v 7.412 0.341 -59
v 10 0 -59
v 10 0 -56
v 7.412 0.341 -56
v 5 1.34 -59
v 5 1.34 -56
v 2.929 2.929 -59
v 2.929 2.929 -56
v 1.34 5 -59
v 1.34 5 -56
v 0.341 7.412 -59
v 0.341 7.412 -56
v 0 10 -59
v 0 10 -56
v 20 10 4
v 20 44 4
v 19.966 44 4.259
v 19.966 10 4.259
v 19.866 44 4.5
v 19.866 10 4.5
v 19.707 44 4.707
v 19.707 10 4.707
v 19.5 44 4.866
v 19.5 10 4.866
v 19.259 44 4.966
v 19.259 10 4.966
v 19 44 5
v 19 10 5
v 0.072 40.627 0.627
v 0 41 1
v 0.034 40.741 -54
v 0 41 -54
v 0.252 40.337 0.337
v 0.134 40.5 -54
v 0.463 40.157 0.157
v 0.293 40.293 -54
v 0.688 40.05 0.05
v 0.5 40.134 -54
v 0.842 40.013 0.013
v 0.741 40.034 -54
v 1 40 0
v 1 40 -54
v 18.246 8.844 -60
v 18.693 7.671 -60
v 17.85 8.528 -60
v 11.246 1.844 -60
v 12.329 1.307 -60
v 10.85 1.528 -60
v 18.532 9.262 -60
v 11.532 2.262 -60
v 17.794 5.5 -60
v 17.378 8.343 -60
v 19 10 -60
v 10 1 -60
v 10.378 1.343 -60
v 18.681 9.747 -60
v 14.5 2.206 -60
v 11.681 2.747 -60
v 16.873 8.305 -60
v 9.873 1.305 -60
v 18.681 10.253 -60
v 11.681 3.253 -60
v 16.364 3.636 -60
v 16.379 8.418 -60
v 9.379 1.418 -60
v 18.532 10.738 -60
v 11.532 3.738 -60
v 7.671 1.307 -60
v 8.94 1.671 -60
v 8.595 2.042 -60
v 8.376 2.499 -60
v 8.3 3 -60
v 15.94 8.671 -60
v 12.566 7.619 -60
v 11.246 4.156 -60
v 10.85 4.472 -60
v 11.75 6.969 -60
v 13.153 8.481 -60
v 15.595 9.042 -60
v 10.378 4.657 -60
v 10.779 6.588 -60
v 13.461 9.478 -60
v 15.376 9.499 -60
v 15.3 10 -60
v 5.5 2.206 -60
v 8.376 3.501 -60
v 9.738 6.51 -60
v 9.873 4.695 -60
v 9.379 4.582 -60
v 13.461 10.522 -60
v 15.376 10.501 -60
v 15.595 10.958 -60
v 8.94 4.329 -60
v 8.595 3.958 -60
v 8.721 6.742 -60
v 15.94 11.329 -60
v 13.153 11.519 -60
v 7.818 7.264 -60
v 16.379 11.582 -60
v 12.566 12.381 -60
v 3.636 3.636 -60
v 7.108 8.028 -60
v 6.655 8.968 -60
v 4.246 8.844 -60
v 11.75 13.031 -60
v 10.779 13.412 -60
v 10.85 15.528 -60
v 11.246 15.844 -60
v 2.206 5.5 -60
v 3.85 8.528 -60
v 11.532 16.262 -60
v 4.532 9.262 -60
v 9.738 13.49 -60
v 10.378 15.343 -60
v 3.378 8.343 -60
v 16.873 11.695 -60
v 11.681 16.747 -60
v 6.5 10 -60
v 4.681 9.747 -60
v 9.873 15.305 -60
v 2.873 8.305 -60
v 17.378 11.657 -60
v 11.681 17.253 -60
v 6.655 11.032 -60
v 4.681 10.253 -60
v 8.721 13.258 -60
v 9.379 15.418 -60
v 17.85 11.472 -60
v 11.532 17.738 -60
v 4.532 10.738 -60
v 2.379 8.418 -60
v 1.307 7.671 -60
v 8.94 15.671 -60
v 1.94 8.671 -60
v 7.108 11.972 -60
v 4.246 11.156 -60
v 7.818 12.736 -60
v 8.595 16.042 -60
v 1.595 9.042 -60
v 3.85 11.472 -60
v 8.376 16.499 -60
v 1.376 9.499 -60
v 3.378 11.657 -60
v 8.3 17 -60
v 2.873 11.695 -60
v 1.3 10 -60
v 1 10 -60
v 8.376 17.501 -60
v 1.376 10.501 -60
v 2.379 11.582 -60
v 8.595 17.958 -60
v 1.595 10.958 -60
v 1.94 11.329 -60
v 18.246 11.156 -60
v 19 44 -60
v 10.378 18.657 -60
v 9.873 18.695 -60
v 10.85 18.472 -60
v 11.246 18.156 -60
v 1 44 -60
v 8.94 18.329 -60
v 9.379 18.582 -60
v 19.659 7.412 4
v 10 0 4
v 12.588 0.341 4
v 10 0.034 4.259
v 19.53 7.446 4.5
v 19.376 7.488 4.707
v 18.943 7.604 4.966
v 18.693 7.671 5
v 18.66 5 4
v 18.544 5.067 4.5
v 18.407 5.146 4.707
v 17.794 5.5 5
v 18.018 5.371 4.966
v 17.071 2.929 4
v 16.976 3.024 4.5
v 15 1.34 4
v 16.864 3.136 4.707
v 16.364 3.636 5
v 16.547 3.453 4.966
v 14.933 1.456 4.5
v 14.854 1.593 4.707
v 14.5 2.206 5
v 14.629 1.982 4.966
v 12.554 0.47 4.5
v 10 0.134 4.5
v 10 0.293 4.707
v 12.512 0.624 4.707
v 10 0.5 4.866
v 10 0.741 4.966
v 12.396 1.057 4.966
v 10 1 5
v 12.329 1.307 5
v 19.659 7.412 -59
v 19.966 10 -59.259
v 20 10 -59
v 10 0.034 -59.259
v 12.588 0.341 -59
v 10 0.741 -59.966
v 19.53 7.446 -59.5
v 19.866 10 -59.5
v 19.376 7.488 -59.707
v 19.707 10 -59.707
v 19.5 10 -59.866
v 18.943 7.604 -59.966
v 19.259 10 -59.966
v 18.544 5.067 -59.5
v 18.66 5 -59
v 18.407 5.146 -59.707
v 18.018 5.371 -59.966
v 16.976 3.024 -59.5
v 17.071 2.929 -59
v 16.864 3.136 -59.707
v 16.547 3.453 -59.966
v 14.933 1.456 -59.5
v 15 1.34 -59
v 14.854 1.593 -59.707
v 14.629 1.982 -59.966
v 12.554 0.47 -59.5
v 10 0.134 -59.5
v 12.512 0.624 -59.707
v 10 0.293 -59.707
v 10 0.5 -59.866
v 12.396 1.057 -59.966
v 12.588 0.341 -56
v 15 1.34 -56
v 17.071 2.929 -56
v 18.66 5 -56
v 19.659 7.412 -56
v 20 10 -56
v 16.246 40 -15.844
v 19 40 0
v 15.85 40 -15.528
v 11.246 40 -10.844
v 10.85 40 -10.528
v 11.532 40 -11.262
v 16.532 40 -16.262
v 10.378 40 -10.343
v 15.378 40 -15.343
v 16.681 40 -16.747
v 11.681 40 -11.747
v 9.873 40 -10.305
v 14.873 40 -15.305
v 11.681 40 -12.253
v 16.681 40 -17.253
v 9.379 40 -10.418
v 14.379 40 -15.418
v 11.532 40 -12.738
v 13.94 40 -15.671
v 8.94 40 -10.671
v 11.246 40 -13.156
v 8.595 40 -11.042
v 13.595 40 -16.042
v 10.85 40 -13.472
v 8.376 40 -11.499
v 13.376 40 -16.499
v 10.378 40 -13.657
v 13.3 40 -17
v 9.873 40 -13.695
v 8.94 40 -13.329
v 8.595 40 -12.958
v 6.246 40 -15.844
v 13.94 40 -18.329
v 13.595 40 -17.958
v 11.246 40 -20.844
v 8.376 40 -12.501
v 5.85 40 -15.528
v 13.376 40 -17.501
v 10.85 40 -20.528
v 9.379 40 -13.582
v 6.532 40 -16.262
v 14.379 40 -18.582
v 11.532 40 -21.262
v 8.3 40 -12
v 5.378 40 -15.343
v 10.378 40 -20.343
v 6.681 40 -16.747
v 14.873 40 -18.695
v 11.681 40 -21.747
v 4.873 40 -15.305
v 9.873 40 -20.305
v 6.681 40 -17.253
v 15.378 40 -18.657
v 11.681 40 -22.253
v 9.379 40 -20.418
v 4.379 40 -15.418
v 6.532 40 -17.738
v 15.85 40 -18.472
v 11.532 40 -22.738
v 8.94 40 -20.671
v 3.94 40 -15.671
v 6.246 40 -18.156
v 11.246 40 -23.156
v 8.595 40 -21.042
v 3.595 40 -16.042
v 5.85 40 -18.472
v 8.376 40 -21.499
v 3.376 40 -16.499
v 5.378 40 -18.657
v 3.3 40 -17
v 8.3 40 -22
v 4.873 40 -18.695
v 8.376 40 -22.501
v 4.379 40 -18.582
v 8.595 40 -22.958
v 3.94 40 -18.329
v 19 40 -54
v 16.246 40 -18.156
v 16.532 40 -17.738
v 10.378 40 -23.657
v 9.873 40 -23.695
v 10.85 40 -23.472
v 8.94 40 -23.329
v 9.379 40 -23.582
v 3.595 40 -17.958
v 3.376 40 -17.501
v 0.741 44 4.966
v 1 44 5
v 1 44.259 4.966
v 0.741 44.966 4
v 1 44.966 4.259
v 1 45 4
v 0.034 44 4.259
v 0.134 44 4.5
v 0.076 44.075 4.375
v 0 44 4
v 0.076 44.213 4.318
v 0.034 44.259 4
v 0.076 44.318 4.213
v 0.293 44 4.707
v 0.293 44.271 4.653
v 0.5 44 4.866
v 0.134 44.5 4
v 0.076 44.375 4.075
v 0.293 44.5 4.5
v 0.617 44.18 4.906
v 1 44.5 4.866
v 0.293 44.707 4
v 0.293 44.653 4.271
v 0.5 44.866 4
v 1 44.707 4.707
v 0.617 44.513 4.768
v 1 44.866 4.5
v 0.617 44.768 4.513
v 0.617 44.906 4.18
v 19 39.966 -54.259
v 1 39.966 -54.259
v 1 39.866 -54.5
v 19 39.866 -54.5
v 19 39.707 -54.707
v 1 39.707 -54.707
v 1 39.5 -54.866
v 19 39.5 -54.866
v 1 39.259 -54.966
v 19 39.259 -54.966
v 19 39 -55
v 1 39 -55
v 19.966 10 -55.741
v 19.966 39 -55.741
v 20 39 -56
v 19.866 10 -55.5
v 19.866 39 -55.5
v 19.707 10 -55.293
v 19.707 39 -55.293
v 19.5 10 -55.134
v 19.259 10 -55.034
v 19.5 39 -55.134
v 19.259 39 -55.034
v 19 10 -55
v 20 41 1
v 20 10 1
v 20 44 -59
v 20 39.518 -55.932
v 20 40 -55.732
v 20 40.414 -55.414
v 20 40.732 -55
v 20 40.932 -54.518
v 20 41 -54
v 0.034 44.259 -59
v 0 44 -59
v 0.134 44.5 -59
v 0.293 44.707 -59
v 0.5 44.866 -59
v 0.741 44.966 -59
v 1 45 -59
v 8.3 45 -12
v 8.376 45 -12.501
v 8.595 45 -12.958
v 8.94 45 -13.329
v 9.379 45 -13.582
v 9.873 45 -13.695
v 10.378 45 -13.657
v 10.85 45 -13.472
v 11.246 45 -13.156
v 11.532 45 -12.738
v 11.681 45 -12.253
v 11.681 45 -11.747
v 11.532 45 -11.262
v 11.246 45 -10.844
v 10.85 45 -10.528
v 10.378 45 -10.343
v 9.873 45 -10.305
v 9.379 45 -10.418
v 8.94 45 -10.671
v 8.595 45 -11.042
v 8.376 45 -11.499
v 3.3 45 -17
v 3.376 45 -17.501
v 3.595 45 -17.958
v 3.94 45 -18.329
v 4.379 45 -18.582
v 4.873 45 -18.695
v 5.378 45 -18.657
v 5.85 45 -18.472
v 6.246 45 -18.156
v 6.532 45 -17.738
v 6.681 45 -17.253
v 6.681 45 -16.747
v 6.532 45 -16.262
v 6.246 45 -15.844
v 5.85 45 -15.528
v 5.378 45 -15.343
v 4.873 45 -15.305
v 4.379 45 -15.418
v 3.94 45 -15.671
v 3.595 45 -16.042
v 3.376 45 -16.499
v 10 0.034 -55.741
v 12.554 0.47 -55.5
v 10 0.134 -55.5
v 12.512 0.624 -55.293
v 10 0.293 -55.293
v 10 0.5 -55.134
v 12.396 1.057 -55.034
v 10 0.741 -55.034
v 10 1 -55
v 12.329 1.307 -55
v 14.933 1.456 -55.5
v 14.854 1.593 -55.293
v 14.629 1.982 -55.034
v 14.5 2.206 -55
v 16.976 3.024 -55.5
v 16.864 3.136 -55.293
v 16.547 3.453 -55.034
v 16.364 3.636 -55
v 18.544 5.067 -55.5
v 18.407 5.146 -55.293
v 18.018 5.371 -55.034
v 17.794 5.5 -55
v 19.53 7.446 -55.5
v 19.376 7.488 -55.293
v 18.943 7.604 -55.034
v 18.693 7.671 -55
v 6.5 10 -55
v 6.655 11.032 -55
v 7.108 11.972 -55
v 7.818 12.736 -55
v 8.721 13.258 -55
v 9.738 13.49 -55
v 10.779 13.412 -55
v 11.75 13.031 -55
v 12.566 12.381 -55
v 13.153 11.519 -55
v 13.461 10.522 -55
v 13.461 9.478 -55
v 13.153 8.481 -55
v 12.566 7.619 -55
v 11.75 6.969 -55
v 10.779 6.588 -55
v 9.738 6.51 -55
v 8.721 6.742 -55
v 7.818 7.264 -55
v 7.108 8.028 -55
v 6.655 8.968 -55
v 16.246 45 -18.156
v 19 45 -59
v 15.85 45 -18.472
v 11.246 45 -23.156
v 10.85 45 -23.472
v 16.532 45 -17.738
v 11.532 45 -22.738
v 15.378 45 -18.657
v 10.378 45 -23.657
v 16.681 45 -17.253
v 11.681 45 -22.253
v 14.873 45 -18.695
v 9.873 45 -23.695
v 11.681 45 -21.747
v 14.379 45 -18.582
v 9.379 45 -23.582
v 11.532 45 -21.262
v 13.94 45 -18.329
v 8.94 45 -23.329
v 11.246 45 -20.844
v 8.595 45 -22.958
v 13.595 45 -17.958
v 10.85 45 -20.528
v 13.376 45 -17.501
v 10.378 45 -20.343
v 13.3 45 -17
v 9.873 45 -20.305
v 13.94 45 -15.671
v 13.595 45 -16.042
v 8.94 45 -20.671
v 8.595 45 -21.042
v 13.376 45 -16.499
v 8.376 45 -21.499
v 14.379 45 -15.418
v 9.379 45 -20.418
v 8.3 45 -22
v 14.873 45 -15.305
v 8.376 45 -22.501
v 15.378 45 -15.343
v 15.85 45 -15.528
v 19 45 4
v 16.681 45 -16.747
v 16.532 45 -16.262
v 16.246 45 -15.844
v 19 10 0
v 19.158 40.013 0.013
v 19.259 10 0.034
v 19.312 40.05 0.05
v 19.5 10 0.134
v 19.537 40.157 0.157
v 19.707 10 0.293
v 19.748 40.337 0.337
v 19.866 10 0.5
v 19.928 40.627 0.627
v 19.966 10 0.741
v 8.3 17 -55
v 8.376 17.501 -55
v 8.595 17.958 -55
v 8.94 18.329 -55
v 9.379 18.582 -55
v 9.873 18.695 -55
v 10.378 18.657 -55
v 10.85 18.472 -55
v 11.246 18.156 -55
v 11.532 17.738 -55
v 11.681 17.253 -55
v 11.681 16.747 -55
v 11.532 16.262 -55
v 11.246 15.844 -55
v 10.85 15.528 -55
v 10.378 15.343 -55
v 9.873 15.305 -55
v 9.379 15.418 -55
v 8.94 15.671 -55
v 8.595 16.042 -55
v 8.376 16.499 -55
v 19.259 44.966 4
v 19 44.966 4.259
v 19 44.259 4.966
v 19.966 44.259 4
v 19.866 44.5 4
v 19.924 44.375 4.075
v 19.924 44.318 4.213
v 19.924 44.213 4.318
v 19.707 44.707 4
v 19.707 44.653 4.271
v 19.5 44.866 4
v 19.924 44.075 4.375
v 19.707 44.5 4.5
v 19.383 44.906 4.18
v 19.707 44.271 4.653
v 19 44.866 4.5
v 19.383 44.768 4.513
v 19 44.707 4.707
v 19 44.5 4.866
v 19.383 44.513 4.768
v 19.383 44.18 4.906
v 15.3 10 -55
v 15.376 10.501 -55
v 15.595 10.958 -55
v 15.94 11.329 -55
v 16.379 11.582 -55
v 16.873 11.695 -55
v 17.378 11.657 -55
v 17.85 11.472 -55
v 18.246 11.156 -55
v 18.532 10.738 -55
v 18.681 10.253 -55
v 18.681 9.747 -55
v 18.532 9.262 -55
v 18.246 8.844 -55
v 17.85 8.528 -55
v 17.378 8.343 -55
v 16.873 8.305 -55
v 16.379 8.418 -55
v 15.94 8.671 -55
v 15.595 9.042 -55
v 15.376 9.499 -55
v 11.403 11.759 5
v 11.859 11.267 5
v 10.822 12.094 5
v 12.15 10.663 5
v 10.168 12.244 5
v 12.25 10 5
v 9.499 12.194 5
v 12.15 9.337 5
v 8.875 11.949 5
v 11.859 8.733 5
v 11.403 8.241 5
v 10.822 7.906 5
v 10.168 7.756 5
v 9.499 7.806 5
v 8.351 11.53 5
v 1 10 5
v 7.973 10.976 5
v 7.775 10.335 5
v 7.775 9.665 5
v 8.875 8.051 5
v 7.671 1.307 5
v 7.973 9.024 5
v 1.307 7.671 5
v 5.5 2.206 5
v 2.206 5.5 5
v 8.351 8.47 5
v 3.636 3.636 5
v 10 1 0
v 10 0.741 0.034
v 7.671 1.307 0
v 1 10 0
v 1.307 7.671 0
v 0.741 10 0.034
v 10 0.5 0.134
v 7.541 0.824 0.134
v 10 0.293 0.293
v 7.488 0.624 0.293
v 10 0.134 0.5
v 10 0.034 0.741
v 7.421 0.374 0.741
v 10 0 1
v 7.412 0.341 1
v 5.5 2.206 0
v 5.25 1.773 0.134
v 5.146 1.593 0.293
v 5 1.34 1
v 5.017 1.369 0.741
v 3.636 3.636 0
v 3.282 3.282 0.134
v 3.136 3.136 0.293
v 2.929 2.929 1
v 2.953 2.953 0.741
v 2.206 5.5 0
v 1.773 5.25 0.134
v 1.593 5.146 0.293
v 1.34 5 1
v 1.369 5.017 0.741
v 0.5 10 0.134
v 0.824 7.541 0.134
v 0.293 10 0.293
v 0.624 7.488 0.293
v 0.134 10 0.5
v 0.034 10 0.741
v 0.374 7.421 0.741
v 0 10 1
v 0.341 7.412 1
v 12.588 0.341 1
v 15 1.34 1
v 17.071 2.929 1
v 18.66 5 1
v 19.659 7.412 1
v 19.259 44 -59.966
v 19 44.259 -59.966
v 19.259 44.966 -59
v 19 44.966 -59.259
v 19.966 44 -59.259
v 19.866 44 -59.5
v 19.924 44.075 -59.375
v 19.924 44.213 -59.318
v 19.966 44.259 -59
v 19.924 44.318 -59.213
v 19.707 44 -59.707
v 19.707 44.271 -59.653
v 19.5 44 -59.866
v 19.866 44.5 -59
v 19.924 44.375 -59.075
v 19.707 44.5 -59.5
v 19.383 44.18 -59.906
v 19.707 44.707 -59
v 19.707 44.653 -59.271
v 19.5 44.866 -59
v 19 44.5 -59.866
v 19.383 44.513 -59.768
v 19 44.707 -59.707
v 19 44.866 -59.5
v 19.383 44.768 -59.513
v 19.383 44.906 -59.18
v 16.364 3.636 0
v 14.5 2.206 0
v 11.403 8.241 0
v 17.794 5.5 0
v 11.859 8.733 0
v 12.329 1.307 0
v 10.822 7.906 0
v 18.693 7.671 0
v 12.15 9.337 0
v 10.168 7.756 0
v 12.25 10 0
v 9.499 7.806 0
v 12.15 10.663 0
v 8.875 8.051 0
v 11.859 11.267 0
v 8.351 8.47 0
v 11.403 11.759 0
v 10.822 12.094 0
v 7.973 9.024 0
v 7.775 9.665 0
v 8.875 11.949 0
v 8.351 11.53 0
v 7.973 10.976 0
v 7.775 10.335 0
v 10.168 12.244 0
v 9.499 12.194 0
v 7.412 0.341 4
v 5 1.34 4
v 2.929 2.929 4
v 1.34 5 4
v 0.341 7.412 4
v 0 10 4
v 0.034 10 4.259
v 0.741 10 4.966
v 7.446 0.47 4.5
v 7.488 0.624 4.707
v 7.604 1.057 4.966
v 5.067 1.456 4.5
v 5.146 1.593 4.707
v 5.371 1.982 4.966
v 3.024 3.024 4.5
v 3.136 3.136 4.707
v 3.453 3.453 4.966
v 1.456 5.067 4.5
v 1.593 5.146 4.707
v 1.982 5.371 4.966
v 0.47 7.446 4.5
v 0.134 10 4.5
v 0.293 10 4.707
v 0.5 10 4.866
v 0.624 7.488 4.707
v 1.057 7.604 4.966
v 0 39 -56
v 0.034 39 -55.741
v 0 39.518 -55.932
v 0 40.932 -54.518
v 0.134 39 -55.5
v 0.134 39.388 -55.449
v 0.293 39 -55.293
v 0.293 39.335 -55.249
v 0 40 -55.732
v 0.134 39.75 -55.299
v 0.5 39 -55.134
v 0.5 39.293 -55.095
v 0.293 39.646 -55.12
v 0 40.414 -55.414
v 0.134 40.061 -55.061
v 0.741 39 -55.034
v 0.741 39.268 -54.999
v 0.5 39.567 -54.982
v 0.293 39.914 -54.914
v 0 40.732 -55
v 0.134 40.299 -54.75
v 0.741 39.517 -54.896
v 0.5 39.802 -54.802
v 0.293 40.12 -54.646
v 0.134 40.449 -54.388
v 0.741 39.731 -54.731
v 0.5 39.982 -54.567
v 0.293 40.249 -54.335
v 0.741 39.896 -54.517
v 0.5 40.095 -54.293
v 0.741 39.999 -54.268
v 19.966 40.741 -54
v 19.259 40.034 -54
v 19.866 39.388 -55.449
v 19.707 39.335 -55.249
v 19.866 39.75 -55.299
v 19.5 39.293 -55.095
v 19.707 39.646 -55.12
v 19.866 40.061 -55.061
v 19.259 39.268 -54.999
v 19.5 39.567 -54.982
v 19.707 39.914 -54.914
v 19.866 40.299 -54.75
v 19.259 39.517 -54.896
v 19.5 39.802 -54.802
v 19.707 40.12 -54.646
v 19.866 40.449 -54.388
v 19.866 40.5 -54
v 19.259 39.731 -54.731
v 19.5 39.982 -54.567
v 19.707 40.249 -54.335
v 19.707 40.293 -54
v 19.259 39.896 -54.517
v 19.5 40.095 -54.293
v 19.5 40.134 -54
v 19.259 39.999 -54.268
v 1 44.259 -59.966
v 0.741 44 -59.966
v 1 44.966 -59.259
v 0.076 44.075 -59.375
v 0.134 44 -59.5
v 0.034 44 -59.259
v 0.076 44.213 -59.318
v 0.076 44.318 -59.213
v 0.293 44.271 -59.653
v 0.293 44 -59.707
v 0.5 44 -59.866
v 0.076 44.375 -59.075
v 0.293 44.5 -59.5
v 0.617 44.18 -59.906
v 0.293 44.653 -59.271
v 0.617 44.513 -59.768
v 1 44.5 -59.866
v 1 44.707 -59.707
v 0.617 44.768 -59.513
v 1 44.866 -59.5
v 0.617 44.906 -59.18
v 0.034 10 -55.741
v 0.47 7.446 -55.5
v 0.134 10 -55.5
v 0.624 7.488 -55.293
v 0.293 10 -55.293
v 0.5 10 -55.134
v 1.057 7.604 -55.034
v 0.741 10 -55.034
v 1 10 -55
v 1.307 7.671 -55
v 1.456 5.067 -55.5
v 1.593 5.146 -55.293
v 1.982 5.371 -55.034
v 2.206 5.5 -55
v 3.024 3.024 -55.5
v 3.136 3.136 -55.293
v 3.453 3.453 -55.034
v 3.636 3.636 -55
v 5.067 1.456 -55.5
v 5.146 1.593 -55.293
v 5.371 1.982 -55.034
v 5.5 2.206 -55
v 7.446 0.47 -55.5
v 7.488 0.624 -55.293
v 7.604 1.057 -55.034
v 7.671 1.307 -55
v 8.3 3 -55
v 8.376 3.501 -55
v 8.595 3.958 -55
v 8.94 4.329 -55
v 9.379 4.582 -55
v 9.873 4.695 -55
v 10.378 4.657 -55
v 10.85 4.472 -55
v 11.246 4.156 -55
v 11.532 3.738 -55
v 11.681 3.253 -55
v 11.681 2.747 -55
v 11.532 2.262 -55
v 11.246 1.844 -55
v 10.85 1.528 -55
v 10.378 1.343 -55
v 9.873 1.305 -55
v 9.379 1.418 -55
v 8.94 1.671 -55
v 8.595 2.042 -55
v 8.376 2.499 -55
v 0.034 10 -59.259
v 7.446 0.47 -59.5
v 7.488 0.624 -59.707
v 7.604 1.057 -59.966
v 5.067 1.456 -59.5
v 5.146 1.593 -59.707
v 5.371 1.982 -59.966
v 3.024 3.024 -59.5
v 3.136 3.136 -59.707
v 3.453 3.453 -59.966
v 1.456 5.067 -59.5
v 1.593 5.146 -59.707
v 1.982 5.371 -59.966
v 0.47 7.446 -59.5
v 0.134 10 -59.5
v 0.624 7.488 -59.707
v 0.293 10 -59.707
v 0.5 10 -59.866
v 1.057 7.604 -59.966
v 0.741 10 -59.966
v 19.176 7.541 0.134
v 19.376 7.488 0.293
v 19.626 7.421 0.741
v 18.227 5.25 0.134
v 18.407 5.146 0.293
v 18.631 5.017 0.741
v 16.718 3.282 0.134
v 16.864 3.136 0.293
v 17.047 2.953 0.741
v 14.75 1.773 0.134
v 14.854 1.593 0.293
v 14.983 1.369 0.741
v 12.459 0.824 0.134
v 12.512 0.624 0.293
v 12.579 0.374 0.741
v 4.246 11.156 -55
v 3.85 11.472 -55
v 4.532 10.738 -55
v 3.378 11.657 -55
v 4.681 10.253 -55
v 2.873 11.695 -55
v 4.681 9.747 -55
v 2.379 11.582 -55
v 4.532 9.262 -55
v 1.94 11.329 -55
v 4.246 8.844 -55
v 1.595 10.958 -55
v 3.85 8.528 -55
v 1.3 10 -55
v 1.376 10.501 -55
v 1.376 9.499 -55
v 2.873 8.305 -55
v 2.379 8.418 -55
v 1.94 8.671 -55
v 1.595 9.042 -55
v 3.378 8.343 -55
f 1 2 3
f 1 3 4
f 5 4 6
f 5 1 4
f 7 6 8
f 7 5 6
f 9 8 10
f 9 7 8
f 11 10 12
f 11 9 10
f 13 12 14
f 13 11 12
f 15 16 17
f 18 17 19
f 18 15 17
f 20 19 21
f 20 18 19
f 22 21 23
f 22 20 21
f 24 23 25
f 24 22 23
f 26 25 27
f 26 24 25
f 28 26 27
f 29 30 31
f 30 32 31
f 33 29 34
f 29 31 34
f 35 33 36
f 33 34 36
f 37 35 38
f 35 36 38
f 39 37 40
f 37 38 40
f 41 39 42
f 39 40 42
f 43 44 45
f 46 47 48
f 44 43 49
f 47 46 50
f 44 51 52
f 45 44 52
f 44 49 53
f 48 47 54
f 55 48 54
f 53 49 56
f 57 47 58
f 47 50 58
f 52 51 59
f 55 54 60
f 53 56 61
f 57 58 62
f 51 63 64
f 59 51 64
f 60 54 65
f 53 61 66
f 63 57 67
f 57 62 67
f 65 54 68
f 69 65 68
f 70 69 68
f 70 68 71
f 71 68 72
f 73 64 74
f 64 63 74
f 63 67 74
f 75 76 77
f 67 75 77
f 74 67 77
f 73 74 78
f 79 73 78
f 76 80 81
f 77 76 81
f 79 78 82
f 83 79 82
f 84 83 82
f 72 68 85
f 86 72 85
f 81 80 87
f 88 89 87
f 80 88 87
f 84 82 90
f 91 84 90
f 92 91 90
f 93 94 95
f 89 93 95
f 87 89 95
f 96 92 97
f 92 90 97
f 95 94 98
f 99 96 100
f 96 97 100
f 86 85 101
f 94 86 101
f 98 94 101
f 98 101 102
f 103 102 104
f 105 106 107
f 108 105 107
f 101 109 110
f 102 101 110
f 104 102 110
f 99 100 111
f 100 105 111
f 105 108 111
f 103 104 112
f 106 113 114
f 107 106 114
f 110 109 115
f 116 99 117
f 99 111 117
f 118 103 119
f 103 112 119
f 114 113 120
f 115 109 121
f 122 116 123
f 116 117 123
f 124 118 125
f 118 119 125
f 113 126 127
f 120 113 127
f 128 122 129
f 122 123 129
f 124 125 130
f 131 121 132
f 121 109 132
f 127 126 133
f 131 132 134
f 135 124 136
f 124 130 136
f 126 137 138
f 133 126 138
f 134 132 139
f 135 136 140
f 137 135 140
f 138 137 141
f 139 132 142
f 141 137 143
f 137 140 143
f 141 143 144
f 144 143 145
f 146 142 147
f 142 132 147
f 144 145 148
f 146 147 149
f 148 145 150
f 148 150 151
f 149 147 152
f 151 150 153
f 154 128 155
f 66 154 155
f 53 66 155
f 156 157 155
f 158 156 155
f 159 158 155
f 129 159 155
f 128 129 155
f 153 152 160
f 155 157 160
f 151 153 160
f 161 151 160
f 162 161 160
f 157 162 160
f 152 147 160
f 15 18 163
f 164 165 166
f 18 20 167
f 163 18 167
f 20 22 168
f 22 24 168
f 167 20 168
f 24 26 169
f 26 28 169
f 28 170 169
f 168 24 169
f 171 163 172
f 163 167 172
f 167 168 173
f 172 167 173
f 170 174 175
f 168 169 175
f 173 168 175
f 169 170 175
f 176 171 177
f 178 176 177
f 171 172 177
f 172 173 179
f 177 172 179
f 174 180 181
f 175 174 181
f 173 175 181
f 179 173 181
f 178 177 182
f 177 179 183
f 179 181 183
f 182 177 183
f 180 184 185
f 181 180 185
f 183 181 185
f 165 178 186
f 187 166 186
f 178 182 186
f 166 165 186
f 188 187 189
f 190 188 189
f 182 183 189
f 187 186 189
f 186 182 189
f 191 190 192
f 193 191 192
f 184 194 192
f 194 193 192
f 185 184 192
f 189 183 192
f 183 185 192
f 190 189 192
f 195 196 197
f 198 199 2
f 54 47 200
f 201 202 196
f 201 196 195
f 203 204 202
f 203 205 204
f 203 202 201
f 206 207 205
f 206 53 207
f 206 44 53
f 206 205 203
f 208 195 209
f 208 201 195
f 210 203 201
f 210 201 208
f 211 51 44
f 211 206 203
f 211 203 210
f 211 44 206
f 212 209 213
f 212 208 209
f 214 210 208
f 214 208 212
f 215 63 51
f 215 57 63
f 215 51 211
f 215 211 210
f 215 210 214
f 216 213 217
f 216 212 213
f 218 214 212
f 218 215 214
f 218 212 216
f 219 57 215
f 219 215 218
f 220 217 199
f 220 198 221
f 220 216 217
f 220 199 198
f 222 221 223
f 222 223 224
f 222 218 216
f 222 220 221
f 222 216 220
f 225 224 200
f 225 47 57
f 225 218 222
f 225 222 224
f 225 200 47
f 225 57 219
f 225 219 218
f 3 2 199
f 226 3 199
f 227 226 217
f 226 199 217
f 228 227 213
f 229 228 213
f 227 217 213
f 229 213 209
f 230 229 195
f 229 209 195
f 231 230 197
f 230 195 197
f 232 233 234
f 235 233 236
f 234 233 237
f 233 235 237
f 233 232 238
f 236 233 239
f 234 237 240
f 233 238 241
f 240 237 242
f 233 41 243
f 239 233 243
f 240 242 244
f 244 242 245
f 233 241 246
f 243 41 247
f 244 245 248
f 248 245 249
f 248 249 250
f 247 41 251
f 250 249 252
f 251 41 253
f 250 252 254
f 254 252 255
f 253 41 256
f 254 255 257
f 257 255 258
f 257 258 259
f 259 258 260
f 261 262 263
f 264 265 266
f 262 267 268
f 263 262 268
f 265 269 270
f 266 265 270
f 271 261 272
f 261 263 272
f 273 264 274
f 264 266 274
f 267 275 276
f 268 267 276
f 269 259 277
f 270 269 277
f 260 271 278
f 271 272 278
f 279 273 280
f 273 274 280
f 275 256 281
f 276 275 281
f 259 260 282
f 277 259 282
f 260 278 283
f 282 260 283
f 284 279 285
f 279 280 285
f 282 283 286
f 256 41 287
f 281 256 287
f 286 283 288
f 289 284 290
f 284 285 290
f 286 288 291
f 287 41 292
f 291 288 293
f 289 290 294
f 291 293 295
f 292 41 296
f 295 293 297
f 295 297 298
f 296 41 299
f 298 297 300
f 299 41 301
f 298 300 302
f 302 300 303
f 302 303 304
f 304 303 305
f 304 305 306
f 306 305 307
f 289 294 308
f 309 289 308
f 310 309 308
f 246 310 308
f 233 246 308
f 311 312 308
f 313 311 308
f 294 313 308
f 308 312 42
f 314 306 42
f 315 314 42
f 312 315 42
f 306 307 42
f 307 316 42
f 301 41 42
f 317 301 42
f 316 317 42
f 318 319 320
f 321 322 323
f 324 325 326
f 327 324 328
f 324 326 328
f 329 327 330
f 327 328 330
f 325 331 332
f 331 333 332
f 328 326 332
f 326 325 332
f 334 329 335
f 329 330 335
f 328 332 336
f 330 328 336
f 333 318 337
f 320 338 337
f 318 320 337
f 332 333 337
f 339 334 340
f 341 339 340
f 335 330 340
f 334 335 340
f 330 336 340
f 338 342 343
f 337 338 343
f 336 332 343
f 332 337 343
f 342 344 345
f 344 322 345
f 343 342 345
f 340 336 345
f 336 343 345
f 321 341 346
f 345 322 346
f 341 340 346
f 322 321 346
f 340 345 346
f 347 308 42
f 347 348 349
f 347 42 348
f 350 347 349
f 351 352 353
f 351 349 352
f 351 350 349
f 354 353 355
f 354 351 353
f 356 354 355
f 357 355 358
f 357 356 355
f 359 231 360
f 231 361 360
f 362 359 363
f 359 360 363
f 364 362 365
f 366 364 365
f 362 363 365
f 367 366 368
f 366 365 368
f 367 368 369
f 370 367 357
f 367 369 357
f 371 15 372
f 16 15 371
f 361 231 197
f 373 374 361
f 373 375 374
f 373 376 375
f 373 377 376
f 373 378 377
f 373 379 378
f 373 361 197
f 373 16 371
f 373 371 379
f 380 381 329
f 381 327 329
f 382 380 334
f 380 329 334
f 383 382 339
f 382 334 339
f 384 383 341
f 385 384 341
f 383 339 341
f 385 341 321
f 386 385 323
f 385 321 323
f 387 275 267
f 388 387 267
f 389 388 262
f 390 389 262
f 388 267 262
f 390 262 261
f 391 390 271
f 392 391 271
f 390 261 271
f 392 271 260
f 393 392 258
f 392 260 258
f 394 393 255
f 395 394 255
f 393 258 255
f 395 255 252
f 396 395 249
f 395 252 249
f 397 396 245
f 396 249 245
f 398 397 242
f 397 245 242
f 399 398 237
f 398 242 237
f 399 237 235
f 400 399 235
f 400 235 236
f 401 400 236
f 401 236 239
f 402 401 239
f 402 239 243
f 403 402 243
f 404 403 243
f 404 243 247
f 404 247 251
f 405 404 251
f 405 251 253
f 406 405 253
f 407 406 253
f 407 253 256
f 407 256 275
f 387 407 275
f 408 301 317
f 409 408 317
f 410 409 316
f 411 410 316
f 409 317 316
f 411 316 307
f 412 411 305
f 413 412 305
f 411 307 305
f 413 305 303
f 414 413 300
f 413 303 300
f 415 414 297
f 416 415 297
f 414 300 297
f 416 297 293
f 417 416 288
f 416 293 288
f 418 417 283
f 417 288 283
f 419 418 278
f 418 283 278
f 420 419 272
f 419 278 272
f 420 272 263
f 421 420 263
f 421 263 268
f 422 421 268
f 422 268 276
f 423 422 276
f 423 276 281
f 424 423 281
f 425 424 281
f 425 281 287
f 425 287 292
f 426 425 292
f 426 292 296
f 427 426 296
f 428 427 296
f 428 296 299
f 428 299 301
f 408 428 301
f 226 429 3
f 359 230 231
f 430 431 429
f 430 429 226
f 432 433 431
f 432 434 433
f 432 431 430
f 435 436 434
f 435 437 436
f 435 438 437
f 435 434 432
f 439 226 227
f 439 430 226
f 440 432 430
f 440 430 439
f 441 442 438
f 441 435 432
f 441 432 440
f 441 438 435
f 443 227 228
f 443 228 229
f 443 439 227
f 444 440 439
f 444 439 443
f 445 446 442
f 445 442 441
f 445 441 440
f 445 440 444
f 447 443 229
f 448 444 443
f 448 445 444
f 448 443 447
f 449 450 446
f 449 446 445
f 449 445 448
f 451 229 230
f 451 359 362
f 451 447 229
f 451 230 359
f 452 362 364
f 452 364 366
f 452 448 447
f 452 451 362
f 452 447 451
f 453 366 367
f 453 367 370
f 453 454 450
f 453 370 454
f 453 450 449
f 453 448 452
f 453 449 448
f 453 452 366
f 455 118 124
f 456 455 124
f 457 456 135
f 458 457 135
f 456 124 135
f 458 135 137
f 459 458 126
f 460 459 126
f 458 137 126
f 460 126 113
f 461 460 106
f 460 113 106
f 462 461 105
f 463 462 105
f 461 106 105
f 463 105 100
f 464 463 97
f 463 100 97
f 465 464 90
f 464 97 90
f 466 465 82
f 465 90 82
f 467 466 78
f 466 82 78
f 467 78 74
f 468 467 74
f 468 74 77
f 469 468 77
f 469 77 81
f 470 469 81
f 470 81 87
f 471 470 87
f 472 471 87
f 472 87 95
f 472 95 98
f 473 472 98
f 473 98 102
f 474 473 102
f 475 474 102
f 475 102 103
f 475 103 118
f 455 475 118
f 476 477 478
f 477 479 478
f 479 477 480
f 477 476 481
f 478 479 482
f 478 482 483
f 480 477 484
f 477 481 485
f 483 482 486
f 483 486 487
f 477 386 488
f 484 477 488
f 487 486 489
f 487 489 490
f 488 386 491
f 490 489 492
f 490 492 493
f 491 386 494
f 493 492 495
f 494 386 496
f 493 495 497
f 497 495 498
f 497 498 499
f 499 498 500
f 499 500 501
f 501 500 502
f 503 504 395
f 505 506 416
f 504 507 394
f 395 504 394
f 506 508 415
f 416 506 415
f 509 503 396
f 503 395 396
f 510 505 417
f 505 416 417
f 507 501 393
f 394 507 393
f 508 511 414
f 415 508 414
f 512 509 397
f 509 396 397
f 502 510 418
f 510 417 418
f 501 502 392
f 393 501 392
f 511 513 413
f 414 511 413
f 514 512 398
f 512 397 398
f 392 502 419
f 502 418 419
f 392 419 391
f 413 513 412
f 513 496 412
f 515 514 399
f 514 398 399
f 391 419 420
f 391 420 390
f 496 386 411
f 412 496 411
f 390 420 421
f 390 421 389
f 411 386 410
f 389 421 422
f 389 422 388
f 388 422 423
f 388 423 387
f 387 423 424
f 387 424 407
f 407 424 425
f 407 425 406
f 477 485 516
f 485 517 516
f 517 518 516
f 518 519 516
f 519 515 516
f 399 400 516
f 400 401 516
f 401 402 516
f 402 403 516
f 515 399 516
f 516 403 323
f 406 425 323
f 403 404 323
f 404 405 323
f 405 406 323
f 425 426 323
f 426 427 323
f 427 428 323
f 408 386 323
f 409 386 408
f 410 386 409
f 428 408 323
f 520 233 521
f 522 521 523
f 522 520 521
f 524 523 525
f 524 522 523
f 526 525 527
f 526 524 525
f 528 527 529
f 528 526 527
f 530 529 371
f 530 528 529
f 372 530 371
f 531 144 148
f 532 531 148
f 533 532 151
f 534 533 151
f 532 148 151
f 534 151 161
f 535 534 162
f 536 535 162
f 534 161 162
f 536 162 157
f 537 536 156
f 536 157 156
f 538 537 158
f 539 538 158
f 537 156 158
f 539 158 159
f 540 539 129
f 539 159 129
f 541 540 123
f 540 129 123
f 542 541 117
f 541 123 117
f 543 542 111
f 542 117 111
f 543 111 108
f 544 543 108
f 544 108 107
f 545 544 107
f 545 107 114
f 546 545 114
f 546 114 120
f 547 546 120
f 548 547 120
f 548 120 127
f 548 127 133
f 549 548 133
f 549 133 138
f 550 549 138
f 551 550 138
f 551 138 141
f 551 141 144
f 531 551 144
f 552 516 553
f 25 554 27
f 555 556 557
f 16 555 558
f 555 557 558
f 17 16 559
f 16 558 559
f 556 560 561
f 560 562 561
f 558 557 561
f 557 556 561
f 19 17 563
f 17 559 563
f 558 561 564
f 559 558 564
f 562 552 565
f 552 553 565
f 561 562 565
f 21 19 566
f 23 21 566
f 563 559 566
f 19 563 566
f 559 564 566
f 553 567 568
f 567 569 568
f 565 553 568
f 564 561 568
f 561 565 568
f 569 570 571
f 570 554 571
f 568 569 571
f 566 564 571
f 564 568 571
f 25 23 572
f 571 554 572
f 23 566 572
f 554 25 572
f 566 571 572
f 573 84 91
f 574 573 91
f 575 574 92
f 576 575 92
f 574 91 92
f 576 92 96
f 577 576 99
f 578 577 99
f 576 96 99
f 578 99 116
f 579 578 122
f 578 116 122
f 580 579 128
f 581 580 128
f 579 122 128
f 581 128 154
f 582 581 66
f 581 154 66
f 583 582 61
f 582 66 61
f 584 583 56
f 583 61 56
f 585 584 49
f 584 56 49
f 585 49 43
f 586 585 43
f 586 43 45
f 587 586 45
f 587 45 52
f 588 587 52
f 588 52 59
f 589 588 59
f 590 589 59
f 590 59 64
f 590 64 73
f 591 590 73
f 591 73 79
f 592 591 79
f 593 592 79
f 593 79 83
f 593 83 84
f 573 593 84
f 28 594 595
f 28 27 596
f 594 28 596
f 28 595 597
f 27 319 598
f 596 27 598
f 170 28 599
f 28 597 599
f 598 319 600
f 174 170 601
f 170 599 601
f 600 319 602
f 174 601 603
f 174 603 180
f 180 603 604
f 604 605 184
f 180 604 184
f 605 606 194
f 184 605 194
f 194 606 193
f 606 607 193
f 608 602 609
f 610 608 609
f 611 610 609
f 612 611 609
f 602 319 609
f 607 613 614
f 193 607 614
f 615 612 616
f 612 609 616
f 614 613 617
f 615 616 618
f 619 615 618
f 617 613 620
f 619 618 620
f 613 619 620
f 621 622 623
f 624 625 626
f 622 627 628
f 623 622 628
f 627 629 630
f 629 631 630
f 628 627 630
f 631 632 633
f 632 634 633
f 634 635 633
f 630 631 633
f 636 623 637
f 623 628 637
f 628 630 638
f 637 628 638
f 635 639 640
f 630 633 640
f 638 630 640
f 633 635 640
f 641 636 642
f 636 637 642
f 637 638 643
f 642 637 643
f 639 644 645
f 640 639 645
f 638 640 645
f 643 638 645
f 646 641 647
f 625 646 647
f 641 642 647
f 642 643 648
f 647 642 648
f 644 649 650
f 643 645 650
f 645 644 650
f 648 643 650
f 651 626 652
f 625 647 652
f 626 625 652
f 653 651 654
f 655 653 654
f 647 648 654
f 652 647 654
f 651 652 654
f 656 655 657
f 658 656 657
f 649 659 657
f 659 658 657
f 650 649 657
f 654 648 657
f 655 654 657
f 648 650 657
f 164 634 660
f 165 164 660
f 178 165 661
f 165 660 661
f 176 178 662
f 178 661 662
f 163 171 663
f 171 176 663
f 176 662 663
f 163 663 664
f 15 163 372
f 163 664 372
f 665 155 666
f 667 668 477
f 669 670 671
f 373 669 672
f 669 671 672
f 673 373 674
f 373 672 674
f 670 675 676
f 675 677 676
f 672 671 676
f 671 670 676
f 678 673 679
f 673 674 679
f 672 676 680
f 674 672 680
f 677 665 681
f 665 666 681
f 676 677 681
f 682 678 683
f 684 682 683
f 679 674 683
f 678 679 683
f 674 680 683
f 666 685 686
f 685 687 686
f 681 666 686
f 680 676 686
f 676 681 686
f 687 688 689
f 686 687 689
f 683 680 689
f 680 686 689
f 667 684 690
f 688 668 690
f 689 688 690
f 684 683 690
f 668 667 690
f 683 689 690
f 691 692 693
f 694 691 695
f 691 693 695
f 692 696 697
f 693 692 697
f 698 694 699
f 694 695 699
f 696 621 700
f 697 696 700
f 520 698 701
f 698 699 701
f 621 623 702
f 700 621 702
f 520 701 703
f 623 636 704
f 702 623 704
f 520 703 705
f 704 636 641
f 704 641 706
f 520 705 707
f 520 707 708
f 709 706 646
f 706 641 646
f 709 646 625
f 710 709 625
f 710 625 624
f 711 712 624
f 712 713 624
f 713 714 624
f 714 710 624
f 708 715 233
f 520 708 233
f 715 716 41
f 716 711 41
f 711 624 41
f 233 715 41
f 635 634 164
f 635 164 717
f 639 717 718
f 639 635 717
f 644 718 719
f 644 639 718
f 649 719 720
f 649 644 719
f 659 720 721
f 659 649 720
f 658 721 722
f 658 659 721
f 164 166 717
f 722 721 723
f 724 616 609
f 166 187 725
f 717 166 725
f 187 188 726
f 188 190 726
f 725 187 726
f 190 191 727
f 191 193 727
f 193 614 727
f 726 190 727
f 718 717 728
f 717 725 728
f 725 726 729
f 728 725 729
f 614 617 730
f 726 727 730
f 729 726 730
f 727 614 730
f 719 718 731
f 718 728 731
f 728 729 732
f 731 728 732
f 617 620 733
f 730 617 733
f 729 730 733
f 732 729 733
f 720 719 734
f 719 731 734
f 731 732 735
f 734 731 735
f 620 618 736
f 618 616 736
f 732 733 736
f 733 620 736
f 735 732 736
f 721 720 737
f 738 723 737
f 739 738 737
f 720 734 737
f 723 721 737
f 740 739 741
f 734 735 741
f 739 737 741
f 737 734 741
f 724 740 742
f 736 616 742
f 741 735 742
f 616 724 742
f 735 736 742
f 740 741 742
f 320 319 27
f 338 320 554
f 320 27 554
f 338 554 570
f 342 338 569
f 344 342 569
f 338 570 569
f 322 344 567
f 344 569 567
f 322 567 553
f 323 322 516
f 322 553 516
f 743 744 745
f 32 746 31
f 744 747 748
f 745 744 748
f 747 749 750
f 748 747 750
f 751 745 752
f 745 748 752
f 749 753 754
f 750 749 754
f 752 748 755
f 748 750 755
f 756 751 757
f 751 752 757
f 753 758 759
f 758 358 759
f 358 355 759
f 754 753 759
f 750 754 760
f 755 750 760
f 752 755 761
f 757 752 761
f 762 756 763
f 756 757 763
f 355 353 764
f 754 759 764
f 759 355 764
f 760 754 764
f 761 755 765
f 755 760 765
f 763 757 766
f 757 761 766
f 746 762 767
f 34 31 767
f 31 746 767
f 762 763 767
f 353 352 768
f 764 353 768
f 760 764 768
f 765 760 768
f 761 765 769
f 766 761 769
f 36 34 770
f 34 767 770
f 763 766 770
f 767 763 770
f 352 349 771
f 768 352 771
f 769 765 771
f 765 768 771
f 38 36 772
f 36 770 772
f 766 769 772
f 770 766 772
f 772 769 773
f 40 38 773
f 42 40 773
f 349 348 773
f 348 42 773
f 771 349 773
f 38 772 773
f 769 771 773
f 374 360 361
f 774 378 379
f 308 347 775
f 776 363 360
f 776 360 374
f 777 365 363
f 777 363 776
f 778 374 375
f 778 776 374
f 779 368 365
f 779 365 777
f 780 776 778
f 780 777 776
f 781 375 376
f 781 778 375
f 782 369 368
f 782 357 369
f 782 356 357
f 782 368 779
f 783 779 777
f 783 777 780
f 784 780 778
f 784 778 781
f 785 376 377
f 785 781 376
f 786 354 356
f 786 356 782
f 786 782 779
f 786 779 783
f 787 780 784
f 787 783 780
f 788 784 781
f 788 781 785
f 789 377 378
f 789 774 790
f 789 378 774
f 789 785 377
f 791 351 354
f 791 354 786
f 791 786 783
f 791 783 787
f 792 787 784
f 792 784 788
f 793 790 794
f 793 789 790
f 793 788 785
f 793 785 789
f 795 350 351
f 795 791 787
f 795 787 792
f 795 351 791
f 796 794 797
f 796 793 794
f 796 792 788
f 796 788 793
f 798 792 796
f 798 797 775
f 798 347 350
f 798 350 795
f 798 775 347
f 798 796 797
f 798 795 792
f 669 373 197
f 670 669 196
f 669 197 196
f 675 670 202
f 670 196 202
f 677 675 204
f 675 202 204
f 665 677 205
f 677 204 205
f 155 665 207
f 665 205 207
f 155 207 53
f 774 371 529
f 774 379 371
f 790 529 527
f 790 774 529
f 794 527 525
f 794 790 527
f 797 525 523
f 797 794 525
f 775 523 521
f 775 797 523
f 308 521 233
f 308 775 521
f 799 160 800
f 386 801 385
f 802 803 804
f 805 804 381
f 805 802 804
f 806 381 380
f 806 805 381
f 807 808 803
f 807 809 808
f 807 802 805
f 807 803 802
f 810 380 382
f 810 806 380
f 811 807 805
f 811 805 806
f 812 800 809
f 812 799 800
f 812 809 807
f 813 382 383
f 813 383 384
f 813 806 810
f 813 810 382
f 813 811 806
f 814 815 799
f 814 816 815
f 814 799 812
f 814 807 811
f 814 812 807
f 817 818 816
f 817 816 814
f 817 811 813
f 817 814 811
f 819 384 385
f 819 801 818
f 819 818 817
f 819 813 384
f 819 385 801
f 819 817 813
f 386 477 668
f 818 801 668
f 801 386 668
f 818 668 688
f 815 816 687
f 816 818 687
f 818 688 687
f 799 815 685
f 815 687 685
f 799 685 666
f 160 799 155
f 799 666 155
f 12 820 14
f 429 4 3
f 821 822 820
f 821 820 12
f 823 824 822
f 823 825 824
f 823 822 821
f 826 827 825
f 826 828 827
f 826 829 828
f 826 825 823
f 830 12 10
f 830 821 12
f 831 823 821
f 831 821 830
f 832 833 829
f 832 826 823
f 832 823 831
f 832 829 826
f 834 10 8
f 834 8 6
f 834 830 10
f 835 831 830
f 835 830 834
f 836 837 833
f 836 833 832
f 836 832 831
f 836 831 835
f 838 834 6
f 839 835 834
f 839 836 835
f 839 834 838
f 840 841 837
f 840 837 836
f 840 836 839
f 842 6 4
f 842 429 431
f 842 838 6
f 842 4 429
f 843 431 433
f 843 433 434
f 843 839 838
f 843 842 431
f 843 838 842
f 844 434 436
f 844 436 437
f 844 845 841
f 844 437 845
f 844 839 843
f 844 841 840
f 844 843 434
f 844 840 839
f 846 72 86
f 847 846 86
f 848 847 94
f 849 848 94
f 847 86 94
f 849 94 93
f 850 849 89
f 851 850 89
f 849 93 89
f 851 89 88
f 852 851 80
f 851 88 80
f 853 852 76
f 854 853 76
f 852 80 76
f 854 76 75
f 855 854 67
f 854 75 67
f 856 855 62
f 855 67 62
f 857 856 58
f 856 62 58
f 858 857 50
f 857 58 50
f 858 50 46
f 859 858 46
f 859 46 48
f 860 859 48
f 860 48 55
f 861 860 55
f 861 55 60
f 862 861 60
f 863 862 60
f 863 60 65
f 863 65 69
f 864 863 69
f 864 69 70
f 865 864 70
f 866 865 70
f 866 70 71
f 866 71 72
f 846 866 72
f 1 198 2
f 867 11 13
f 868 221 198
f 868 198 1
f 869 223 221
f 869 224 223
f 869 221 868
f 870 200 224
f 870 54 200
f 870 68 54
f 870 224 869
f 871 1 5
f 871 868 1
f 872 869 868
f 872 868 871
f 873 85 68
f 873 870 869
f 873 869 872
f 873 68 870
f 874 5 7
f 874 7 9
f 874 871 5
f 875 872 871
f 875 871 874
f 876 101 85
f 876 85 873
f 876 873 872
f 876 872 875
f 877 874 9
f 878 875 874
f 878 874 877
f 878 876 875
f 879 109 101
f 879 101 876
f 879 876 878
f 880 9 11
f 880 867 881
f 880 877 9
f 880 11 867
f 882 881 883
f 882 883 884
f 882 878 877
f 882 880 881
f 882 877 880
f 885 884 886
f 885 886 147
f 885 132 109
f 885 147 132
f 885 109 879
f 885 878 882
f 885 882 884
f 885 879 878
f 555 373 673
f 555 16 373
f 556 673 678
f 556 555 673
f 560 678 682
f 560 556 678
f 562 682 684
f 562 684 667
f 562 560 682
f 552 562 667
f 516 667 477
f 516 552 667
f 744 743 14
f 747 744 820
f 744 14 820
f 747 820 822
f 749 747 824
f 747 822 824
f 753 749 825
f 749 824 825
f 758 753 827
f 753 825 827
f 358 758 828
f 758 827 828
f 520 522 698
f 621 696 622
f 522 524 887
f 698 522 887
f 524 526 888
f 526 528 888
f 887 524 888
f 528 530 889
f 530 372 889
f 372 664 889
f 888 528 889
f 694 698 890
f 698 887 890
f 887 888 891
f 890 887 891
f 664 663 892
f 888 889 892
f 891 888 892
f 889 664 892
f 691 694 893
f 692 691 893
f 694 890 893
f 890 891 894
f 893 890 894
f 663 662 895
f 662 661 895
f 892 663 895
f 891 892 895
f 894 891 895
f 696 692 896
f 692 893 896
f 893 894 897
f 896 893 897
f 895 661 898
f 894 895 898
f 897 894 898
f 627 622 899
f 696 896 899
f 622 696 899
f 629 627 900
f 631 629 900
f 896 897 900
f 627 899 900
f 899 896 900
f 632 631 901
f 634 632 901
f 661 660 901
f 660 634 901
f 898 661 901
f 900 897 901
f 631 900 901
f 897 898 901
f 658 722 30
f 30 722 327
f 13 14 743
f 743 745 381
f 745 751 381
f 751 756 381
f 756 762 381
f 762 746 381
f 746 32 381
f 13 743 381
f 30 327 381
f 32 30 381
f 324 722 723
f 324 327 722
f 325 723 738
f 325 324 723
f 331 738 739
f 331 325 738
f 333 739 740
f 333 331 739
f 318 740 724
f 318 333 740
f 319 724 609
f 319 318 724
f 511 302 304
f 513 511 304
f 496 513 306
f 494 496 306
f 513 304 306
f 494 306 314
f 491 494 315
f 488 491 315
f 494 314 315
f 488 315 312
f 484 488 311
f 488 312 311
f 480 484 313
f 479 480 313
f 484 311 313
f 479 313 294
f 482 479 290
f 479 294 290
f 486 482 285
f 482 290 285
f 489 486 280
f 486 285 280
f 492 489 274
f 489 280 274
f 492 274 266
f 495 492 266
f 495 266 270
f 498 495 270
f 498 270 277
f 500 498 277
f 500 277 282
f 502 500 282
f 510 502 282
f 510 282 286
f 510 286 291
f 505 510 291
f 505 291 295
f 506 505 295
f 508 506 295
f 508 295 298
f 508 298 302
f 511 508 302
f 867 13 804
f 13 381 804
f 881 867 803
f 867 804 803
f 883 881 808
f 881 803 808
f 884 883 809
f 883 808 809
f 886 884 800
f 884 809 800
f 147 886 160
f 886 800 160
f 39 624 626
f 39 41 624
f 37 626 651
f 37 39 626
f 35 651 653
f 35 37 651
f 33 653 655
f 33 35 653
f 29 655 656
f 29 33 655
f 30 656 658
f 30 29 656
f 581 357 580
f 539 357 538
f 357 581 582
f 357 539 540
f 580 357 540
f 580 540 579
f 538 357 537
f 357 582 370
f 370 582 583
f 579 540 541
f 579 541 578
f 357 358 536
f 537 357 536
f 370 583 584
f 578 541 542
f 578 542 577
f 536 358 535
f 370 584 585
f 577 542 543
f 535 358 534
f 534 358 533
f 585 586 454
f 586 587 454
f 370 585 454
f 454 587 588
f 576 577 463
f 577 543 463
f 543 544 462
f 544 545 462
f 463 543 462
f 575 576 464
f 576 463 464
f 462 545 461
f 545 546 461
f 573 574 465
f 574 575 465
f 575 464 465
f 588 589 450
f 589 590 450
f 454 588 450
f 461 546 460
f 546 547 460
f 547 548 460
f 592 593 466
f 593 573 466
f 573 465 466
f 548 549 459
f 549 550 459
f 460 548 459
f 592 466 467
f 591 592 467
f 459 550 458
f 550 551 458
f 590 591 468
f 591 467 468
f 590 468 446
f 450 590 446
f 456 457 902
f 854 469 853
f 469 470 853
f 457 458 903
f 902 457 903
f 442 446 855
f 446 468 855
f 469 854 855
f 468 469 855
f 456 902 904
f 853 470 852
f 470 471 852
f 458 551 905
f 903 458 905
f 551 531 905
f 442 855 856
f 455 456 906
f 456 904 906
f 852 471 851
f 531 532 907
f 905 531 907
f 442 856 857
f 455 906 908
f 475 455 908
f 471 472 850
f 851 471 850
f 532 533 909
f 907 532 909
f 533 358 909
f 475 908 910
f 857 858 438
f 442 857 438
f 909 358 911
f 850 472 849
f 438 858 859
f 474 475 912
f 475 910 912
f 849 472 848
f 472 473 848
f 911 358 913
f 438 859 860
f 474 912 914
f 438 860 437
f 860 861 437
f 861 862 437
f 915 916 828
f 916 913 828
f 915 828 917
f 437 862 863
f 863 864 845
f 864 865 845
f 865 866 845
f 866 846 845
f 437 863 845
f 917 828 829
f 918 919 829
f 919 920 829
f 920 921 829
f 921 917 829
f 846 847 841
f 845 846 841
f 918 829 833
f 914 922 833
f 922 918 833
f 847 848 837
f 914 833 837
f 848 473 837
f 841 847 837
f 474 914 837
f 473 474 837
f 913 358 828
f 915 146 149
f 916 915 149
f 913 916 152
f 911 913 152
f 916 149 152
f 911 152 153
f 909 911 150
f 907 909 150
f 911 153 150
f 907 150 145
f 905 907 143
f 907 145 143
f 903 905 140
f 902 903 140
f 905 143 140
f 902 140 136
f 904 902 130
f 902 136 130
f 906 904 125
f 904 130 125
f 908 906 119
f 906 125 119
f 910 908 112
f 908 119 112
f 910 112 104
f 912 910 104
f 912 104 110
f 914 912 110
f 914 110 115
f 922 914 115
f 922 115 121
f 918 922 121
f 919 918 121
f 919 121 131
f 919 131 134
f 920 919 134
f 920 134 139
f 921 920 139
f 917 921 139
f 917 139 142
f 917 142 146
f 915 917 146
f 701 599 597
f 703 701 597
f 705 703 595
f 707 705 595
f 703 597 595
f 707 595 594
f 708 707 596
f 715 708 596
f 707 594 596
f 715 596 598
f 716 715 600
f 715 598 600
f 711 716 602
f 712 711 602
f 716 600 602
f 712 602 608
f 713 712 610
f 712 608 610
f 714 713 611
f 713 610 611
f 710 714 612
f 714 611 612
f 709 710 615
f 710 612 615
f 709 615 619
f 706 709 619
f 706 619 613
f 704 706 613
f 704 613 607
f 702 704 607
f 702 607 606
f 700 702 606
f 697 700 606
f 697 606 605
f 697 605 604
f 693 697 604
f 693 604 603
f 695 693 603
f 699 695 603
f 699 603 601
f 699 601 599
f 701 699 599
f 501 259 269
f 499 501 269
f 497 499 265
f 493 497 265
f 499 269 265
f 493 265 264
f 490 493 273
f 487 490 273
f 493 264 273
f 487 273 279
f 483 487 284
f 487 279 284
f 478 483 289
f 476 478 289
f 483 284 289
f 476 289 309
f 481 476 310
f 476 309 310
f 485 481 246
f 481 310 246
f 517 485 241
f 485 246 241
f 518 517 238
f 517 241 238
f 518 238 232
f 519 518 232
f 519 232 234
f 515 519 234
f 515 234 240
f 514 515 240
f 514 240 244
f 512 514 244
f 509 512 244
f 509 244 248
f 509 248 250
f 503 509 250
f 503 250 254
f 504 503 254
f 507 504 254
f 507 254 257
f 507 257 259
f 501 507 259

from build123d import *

# Parameters (mm, degrees)
EXTRUDE_1_DEPTH        = 20
FILLET_1_R             = 10
HOLE_WIZARD_M3_1_D     = 3.4
HOLE_WIZARD_M3_1_DEPTH = 20
HOLE_WIZARD_M3_1_TIP   = 1.021463052
HOLE_WIZARD_M4_1_D     = 4.5
HOLE_WIZARD_M4_1_DEPTH = 20
HOLE_WIZARD_M4_1_TIP   = 1.351936393
HOLE_WIZARD_M3_2_D     = 3.4
FILLET_2_R             = 1
SKETCH_8_R             = 3.5
CUT_EXTRUDE_1_DEPTH    = 10


with BuildPart() as part:
    # 草图1 → 凸台-拉伸1 (new body)
    with BuildSketch(Plane(origin=(0, 0, 0), x_dir=(0, 0, -1), z_dir=(1, 0, 0))):
        Polygon((0, 0), (0, 40), (55, 40), (55, 0), (60, 0), (60, 45), (-5, 45), (-5, 0), align=None)
    extrude(amount=EXTRUDE_1_DEPTH)

    # 圆角1
    fillet_1_edges = [part.edges().sort_by_distance(p)[0] for p in [
        (0, 0, -57.5),
        (20, 0, -57.5),
        (0, 0, 2.5),
        (20, 0, 2.5),
    ]]
    fillet(fillet_1_edges, radius=FILLET_1_R - 0.0001)  # a hair under: the kernel refuses the full size

    # M3 间隙孔1
    with Locations(Plane.XY.offset(-55)):
        with Locations((10, 3), (10, 17), (3, 10), (17, 10)):
            Hole(HOLE_WIZARD_M3_1_D / 2, depth=HOLE_WIZARD_M3_1_DEPTH)
            with Locations((0, 0, -(HOLE_WIZARD_M3_1_DEPTH + HOLE_WIZARD_M3_1_TIP / 2))):  # 118° drill point
                Cone(0, HOLE_WIZARD_M3_1_D / 2, HOLE_WIZARD_M3_1_TIP, mode=Mode.SUBTRACT)

    # M4 间隙孔1
    with Locations(Plane(origin=(0, 0, 0), x_dir=(-1, 0, 0), z_dir=(0, 0, -1))):
        with Locations((-10, 10)):
            Hole(HOLE_WIZARD_M4_1_D / 2, depth=HOLE_WIZARD_M4_1_DEPTH)
            with Locations((0, 0, -(HOLE_WIZARD_M4_1_DEPTH + HOLE_WIZARD_M4_1_TIP / 2))):  # 118° drill point
                Cone(0, HOLE_WIZARD_M4_1_D / 2, HOLE_WIZARD_M4_1_TIP, mode=Mode.SUBTRACT)

    # M3 间隙孔2 (through all)
    with Locations(Plane(origin=(0, 45, 0), x_dir=(1, 0, 0), z_dir=(0, 1, 0))):
        with Locations((15, 17), (10, 22), (5, 17), (10, 12)):
            Hole(HOLE_WIZARD_M3_2_D / 2)

    # 圆角2
    fillet_2_edges = [part.edges().sort_by_distance(p)[0] for p in [
        (0, 24.99995, -55),
        (0, 40, -27.5),
        (20, 40, -27.5),
        (10, 45, 5),
        (10, 45, -60),
        (10, 40, -55),
        (20, 24.99995, -55),
        (0, 27.49995, -60),
        (20, 27.49995, -60),
        (17.071097101, 2.928902899, -60),
        (2.928902899, 2.928902899, -60),
        (0, 24.99995, 0),
        (20, 45, -27.5),
        (17.071097101, 2.928902899, -55),
        (2.928902899, 2.928902899, -55),
        (20, 24.99995, 0),
        (20, 27.49995, 5),
        (17.071097101, 2.928902899, 0),
        (2.928902899, 2.928902899, 0),
        (17.071097101, 2.928902899, 5),
        (2.928902899, 2.928902899, 5),
        (0, 27.49995, 5),
        (0, 45, -27.5),
    ]]
    fillet(fillet_2_edges, radius=FILLET_2_R)

    # 草图8 → 切除-拉伸1 (cut)
    with BuildSketch(Plane(origin=(0, 0, -60), x_dir=(-1, 0, 0), z_dir=(0, 0, -1))):
        with Locations((-10, 10)):
            Circle(SKETCH_8_R)
    extrude(amount=-CUT_EXTRUDE_1_DEPTH, mode=Mode.SUBTRACT)


solid = part.part
